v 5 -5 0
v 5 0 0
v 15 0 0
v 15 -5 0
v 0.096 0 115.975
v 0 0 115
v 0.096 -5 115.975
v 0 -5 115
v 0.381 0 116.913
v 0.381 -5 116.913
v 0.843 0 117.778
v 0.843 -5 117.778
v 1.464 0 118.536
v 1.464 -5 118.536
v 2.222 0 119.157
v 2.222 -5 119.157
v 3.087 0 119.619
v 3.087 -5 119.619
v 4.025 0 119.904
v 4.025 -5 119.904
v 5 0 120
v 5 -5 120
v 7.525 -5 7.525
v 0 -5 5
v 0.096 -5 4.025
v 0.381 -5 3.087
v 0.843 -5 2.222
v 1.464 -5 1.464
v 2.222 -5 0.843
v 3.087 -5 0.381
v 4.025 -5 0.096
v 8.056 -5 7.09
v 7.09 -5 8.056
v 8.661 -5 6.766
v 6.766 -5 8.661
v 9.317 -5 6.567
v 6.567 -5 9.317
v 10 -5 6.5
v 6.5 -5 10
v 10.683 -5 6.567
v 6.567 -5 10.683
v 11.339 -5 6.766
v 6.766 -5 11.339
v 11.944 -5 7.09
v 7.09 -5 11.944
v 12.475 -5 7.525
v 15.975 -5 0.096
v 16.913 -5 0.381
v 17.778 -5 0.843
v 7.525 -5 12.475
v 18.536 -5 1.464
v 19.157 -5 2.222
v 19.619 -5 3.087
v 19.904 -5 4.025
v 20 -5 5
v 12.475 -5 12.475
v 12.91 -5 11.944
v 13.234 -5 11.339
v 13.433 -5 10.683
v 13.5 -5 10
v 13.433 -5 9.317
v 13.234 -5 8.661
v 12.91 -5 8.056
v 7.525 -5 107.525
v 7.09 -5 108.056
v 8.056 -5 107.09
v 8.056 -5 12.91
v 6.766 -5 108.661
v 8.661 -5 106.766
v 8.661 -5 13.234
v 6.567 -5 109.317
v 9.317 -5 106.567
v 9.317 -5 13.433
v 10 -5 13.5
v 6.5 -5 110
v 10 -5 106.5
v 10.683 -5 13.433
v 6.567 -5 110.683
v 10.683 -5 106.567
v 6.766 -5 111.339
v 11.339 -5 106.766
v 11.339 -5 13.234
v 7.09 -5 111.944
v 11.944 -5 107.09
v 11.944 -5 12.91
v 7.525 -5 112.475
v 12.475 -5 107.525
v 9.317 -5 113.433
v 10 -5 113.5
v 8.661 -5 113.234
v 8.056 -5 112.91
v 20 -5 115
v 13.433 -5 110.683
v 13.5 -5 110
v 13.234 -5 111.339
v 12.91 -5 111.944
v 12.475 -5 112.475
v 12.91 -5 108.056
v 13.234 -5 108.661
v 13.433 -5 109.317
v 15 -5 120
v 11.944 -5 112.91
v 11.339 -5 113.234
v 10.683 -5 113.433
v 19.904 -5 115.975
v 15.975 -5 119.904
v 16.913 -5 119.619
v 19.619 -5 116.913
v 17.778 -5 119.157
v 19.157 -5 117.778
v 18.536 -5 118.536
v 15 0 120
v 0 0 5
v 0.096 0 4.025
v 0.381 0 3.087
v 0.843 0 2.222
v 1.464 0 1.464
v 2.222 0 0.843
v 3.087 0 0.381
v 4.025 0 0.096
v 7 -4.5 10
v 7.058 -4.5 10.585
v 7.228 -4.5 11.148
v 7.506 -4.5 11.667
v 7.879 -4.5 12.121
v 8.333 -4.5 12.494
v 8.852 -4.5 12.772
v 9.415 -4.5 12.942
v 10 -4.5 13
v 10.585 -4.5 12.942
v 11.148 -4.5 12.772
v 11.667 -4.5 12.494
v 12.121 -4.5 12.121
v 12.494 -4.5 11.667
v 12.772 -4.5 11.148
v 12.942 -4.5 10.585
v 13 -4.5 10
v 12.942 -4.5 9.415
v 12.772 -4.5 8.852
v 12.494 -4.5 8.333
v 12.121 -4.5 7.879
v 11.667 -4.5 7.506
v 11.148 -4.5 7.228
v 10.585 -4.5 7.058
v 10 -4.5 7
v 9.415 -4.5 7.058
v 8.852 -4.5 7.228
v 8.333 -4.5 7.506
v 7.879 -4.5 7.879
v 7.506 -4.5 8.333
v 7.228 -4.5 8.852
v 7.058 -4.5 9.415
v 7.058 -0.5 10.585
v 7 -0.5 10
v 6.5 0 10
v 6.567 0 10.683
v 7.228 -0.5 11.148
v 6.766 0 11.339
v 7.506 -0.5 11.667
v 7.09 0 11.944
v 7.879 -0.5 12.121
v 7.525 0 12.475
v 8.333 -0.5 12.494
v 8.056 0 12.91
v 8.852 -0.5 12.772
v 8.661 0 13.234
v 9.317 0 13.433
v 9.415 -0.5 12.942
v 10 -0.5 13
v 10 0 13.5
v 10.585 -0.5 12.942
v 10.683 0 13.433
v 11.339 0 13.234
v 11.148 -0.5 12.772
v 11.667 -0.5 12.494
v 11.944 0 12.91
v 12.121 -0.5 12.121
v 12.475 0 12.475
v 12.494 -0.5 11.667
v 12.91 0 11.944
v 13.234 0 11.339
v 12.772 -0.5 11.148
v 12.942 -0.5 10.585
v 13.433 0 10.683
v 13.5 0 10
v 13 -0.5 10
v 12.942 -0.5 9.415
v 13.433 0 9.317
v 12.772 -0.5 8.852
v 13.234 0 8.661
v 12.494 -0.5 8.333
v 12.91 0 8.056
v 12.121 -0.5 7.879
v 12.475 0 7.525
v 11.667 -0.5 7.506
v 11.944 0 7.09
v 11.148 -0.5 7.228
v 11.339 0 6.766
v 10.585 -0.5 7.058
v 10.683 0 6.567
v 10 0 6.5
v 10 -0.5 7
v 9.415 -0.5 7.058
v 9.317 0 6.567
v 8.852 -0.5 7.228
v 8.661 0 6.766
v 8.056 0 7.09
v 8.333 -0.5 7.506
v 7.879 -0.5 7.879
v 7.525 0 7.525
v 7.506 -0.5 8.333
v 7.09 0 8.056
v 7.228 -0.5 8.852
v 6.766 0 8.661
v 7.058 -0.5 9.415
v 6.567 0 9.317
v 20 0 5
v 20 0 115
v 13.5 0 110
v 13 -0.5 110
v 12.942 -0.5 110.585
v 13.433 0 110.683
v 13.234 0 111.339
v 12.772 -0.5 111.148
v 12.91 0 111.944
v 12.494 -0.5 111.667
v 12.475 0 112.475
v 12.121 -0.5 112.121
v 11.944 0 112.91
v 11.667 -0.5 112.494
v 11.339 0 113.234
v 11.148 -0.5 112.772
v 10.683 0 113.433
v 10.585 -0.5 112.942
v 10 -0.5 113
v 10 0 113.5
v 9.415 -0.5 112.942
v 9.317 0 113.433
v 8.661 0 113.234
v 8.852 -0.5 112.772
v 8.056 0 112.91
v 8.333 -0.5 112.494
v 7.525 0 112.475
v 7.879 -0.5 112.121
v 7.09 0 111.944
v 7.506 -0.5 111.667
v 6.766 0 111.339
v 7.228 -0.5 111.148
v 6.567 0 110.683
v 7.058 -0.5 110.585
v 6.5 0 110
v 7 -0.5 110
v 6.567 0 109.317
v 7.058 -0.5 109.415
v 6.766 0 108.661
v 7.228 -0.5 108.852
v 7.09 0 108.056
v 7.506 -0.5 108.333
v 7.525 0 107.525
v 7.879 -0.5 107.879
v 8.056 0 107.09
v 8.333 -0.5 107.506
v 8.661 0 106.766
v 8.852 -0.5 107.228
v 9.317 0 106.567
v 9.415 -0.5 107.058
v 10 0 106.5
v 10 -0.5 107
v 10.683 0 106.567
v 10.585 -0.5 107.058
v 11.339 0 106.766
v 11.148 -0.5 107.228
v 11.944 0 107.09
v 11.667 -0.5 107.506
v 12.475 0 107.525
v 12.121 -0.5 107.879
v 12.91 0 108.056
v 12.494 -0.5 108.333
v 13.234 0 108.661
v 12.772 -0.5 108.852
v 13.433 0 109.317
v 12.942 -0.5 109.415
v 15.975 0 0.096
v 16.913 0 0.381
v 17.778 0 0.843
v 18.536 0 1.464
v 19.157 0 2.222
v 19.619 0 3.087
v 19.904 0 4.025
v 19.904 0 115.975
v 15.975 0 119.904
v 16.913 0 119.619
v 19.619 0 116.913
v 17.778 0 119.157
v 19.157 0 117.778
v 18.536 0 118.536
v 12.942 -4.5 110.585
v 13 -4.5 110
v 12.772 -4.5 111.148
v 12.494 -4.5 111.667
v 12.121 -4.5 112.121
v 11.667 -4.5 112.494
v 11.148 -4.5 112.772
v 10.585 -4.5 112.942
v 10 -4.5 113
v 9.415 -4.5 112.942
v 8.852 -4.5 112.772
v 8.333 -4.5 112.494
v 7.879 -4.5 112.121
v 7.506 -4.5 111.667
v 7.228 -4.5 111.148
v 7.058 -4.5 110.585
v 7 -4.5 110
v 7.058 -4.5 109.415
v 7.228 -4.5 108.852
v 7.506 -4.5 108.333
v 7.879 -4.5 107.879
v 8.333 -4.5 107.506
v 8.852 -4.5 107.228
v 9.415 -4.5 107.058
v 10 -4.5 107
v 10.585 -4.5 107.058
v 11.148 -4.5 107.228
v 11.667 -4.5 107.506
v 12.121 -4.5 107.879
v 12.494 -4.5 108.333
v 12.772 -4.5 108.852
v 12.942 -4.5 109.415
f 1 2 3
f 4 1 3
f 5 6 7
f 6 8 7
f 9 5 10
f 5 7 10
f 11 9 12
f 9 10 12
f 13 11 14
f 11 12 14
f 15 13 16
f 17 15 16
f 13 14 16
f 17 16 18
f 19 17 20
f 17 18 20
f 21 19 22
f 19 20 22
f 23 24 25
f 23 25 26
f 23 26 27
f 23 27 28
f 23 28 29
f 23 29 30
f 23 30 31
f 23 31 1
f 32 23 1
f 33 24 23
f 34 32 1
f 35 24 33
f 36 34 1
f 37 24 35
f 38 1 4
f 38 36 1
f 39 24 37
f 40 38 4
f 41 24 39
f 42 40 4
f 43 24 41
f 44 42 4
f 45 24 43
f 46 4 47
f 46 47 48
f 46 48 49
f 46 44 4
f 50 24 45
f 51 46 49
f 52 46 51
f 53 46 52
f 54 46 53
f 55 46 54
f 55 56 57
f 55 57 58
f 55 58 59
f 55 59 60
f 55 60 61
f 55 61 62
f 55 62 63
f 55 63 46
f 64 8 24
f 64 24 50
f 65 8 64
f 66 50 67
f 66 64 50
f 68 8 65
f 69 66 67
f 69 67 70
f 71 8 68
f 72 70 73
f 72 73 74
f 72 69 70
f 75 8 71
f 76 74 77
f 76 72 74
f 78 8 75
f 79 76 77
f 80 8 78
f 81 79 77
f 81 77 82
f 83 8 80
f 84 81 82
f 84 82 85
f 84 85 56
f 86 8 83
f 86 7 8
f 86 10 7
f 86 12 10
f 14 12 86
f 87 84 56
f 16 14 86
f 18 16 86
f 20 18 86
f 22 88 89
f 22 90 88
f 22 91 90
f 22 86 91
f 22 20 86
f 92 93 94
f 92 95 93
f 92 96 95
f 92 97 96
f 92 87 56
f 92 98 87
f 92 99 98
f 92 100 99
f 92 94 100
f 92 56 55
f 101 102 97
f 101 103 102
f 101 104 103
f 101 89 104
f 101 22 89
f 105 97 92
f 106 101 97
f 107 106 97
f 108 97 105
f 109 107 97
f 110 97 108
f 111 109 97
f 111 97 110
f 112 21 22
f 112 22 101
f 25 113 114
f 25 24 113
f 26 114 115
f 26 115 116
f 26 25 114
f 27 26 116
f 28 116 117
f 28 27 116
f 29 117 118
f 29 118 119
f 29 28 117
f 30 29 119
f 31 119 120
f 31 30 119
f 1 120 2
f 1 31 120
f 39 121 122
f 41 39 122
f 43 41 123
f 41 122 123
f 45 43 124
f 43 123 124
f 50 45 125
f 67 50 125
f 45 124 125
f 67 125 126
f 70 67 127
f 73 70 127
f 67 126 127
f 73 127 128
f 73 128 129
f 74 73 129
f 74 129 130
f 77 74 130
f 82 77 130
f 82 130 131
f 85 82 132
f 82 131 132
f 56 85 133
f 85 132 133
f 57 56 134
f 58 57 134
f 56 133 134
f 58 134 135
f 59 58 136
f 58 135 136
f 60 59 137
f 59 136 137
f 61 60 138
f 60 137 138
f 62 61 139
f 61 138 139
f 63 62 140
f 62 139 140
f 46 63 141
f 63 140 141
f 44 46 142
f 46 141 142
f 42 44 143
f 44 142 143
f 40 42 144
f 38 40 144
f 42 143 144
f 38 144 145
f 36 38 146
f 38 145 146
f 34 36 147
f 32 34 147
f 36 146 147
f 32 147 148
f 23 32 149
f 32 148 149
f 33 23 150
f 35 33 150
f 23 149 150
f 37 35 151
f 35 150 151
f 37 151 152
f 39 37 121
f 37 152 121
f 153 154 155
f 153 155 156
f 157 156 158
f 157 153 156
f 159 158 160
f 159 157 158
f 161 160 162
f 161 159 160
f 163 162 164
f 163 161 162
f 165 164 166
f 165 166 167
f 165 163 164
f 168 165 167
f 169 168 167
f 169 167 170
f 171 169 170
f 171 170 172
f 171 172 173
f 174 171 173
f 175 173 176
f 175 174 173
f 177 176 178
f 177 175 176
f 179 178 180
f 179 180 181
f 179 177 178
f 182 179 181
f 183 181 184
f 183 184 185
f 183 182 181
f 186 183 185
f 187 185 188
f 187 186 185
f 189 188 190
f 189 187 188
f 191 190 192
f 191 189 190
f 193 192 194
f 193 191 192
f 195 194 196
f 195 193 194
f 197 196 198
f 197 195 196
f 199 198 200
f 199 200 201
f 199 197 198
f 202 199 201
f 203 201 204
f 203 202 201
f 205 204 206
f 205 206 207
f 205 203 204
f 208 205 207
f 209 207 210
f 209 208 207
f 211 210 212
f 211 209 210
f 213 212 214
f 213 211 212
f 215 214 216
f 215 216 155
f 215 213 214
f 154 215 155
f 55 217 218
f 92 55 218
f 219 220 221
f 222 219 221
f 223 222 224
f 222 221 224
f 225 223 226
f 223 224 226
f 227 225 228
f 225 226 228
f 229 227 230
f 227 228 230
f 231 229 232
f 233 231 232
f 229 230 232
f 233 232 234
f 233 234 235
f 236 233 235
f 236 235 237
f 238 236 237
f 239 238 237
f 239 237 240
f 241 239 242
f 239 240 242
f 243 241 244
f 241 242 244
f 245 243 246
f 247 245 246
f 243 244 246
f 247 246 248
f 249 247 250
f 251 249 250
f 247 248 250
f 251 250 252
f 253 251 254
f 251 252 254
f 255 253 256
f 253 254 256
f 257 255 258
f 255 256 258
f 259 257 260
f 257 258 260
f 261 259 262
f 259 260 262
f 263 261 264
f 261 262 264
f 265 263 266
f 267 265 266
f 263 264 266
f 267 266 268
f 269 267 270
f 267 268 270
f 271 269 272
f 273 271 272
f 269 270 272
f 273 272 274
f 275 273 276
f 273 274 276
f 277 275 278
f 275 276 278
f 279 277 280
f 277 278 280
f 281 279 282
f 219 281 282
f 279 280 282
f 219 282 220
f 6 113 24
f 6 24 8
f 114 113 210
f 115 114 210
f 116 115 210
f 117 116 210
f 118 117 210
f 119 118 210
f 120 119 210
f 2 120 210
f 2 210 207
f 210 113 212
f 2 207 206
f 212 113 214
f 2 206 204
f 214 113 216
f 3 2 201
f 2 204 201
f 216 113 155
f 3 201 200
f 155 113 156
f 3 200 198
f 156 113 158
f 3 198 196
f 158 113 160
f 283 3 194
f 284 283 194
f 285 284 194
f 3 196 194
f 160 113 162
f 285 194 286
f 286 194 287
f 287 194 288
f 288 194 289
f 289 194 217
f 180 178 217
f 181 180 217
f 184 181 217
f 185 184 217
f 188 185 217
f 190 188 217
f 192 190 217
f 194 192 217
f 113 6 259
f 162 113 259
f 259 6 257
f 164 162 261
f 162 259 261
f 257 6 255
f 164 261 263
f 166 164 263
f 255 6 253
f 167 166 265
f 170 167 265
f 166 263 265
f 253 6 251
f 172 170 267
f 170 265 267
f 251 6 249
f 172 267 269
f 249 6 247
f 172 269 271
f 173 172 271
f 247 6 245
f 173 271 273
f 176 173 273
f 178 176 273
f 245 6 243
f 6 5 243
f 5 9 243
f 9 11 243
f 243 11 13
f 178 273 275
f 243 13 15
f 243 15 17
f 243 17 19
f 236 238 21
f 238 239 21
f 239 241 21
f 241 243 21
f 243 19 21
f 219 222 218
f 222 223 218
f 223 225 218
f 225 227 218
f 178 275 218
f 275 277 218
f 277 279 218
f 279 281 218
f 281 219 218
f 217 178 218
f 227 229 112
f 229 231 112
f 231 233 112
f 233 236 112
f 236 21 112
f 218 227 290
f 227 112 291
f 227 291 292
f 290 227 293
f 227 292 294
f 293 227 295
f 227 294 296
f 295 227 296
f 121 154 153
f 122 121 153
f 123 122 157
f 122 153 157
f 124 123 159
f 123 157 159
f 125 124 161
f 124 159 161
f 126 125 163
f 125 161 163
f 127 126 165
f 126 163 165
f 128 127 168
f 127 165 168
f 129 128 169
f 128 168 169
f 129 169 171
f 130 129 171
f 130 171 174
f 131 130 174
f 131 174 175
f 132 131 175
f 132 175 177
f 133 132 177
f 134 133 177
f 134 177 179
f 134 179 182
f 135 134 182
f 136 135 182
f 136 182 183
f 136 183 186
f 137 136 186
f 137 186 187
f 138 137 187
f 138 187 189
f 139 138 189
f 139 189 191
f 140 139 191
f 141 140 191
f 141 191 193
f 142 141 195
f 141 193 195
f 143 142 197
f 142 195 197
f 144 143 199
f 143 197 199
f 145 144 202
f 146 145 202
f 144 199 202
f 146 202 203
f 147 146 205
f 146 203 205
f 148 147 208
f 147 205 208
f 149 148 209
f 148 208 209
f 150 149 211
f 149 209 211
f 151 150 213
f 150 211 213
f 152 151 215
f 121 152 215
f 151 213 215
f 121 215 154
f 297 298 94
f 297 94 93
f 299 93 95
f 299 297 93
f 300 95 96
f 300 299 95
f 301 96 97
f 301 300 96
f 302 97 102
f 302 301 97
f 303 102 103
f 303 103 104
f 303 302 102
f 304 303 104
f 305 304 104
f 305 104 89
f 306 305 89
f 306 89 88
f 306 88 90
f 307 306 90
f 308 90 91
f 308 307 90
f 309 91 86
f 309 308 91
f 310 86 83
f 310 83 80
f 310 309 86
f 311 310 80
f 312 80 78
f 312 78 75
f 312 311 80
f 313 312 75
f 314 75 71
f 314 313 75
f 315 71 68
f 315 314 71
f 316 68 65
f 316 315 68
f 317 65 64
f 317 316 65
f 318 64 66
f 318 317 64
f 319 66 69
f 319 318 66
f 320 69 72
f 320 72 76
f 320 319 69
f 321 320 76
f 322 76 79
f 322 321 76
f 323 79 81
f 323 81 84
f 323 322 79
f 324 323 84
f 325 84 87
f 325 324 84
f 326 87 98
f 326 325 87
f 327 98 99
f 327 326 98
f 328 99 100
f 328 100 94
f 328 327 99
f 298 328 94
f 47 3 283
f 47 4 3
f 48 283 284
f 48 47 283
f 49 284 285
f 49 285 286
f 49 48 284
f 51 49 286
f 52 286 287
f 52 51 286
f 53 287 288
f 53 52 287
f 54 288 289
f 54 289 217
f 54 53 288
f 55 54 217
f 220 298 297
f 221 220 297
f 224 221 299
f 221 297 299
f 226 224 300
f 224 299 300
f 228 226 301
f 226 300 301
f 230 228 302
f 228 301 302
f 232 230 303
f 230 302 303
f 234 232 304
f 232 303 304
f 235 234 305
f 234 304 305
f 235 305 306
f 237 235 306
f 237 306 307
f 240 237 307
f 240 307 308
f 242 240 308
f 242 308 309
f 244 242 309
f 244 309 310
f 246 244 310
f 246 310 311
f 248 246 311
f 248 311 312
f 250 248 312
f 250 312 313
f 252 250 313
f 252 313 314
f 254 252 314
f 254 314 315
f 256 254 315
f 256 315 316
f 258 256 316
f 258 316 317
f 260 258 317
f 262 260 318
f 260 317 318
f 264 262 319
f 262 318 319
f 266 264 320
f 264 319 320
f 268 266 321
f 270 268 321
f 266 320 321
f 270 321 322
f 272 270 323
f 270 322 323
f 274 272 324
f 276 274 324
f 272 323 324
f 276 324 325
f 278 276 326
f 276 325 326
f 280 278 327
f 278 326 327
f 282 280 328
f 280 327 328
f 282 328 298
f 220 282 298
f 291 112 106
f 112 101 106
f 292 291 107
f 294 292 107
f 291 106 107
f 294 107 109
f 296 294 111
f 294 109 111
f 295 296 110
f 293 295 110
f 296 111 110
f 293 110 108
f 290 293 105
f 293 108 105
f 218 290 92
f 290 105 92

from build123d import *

# Parameters (mm, degrees)
F0_W     = 20
F0_H     = 120
F1_DEPTH = 5
F2_R     = 3
F3_DEPTH = 5.001
F5_D     = 6
F6_SIZE  = 0.5
F7_R     = 5


with BuildPart() as f1:
    # F0 (on Front) → F1 (new body)
    with BuildSketch(Plane.XZ):
        with Locations((10, 60)):
            Rectangle(F0_W, F0_H)
    extrude(amount=F1_DEPTH)

    # F2 (on face) → F3 (cut, through all)
    with BuildSketch(Plane.XZ.offset(5)):
        with Locations((10, 110)):
            Circle(F2_R)
    extrude(amount=-F3_DEPTH, mode=Mode.SUBTRACT)

    # F5 (through all)
    with Locations(Plane.XZ.offset(5)):
        with Locations((10, 10)):
            Hole(F5_D / 2)

    # F6
    f6_edges = [f1.edges().sort_by_distance(p)[0] for p in [
        (7, -5, 110),
        (7, 0, 110),
        (7, 0, 10),
        (7, -5, 10),
    ]]
    chamfer(f6_edges, length=F6_SIZE)

    # F7
    f7_edges = [f1.edges().sort_by_distance(p)[0] for p in [
        (20, -2.5, 120),
        (0, -2.5, 120),
        (20, -2.5, 0),
        (0, -2.5, 0),
    ]]
    fillet(f7_edges, radius=F7_R)


solid = f1.part
